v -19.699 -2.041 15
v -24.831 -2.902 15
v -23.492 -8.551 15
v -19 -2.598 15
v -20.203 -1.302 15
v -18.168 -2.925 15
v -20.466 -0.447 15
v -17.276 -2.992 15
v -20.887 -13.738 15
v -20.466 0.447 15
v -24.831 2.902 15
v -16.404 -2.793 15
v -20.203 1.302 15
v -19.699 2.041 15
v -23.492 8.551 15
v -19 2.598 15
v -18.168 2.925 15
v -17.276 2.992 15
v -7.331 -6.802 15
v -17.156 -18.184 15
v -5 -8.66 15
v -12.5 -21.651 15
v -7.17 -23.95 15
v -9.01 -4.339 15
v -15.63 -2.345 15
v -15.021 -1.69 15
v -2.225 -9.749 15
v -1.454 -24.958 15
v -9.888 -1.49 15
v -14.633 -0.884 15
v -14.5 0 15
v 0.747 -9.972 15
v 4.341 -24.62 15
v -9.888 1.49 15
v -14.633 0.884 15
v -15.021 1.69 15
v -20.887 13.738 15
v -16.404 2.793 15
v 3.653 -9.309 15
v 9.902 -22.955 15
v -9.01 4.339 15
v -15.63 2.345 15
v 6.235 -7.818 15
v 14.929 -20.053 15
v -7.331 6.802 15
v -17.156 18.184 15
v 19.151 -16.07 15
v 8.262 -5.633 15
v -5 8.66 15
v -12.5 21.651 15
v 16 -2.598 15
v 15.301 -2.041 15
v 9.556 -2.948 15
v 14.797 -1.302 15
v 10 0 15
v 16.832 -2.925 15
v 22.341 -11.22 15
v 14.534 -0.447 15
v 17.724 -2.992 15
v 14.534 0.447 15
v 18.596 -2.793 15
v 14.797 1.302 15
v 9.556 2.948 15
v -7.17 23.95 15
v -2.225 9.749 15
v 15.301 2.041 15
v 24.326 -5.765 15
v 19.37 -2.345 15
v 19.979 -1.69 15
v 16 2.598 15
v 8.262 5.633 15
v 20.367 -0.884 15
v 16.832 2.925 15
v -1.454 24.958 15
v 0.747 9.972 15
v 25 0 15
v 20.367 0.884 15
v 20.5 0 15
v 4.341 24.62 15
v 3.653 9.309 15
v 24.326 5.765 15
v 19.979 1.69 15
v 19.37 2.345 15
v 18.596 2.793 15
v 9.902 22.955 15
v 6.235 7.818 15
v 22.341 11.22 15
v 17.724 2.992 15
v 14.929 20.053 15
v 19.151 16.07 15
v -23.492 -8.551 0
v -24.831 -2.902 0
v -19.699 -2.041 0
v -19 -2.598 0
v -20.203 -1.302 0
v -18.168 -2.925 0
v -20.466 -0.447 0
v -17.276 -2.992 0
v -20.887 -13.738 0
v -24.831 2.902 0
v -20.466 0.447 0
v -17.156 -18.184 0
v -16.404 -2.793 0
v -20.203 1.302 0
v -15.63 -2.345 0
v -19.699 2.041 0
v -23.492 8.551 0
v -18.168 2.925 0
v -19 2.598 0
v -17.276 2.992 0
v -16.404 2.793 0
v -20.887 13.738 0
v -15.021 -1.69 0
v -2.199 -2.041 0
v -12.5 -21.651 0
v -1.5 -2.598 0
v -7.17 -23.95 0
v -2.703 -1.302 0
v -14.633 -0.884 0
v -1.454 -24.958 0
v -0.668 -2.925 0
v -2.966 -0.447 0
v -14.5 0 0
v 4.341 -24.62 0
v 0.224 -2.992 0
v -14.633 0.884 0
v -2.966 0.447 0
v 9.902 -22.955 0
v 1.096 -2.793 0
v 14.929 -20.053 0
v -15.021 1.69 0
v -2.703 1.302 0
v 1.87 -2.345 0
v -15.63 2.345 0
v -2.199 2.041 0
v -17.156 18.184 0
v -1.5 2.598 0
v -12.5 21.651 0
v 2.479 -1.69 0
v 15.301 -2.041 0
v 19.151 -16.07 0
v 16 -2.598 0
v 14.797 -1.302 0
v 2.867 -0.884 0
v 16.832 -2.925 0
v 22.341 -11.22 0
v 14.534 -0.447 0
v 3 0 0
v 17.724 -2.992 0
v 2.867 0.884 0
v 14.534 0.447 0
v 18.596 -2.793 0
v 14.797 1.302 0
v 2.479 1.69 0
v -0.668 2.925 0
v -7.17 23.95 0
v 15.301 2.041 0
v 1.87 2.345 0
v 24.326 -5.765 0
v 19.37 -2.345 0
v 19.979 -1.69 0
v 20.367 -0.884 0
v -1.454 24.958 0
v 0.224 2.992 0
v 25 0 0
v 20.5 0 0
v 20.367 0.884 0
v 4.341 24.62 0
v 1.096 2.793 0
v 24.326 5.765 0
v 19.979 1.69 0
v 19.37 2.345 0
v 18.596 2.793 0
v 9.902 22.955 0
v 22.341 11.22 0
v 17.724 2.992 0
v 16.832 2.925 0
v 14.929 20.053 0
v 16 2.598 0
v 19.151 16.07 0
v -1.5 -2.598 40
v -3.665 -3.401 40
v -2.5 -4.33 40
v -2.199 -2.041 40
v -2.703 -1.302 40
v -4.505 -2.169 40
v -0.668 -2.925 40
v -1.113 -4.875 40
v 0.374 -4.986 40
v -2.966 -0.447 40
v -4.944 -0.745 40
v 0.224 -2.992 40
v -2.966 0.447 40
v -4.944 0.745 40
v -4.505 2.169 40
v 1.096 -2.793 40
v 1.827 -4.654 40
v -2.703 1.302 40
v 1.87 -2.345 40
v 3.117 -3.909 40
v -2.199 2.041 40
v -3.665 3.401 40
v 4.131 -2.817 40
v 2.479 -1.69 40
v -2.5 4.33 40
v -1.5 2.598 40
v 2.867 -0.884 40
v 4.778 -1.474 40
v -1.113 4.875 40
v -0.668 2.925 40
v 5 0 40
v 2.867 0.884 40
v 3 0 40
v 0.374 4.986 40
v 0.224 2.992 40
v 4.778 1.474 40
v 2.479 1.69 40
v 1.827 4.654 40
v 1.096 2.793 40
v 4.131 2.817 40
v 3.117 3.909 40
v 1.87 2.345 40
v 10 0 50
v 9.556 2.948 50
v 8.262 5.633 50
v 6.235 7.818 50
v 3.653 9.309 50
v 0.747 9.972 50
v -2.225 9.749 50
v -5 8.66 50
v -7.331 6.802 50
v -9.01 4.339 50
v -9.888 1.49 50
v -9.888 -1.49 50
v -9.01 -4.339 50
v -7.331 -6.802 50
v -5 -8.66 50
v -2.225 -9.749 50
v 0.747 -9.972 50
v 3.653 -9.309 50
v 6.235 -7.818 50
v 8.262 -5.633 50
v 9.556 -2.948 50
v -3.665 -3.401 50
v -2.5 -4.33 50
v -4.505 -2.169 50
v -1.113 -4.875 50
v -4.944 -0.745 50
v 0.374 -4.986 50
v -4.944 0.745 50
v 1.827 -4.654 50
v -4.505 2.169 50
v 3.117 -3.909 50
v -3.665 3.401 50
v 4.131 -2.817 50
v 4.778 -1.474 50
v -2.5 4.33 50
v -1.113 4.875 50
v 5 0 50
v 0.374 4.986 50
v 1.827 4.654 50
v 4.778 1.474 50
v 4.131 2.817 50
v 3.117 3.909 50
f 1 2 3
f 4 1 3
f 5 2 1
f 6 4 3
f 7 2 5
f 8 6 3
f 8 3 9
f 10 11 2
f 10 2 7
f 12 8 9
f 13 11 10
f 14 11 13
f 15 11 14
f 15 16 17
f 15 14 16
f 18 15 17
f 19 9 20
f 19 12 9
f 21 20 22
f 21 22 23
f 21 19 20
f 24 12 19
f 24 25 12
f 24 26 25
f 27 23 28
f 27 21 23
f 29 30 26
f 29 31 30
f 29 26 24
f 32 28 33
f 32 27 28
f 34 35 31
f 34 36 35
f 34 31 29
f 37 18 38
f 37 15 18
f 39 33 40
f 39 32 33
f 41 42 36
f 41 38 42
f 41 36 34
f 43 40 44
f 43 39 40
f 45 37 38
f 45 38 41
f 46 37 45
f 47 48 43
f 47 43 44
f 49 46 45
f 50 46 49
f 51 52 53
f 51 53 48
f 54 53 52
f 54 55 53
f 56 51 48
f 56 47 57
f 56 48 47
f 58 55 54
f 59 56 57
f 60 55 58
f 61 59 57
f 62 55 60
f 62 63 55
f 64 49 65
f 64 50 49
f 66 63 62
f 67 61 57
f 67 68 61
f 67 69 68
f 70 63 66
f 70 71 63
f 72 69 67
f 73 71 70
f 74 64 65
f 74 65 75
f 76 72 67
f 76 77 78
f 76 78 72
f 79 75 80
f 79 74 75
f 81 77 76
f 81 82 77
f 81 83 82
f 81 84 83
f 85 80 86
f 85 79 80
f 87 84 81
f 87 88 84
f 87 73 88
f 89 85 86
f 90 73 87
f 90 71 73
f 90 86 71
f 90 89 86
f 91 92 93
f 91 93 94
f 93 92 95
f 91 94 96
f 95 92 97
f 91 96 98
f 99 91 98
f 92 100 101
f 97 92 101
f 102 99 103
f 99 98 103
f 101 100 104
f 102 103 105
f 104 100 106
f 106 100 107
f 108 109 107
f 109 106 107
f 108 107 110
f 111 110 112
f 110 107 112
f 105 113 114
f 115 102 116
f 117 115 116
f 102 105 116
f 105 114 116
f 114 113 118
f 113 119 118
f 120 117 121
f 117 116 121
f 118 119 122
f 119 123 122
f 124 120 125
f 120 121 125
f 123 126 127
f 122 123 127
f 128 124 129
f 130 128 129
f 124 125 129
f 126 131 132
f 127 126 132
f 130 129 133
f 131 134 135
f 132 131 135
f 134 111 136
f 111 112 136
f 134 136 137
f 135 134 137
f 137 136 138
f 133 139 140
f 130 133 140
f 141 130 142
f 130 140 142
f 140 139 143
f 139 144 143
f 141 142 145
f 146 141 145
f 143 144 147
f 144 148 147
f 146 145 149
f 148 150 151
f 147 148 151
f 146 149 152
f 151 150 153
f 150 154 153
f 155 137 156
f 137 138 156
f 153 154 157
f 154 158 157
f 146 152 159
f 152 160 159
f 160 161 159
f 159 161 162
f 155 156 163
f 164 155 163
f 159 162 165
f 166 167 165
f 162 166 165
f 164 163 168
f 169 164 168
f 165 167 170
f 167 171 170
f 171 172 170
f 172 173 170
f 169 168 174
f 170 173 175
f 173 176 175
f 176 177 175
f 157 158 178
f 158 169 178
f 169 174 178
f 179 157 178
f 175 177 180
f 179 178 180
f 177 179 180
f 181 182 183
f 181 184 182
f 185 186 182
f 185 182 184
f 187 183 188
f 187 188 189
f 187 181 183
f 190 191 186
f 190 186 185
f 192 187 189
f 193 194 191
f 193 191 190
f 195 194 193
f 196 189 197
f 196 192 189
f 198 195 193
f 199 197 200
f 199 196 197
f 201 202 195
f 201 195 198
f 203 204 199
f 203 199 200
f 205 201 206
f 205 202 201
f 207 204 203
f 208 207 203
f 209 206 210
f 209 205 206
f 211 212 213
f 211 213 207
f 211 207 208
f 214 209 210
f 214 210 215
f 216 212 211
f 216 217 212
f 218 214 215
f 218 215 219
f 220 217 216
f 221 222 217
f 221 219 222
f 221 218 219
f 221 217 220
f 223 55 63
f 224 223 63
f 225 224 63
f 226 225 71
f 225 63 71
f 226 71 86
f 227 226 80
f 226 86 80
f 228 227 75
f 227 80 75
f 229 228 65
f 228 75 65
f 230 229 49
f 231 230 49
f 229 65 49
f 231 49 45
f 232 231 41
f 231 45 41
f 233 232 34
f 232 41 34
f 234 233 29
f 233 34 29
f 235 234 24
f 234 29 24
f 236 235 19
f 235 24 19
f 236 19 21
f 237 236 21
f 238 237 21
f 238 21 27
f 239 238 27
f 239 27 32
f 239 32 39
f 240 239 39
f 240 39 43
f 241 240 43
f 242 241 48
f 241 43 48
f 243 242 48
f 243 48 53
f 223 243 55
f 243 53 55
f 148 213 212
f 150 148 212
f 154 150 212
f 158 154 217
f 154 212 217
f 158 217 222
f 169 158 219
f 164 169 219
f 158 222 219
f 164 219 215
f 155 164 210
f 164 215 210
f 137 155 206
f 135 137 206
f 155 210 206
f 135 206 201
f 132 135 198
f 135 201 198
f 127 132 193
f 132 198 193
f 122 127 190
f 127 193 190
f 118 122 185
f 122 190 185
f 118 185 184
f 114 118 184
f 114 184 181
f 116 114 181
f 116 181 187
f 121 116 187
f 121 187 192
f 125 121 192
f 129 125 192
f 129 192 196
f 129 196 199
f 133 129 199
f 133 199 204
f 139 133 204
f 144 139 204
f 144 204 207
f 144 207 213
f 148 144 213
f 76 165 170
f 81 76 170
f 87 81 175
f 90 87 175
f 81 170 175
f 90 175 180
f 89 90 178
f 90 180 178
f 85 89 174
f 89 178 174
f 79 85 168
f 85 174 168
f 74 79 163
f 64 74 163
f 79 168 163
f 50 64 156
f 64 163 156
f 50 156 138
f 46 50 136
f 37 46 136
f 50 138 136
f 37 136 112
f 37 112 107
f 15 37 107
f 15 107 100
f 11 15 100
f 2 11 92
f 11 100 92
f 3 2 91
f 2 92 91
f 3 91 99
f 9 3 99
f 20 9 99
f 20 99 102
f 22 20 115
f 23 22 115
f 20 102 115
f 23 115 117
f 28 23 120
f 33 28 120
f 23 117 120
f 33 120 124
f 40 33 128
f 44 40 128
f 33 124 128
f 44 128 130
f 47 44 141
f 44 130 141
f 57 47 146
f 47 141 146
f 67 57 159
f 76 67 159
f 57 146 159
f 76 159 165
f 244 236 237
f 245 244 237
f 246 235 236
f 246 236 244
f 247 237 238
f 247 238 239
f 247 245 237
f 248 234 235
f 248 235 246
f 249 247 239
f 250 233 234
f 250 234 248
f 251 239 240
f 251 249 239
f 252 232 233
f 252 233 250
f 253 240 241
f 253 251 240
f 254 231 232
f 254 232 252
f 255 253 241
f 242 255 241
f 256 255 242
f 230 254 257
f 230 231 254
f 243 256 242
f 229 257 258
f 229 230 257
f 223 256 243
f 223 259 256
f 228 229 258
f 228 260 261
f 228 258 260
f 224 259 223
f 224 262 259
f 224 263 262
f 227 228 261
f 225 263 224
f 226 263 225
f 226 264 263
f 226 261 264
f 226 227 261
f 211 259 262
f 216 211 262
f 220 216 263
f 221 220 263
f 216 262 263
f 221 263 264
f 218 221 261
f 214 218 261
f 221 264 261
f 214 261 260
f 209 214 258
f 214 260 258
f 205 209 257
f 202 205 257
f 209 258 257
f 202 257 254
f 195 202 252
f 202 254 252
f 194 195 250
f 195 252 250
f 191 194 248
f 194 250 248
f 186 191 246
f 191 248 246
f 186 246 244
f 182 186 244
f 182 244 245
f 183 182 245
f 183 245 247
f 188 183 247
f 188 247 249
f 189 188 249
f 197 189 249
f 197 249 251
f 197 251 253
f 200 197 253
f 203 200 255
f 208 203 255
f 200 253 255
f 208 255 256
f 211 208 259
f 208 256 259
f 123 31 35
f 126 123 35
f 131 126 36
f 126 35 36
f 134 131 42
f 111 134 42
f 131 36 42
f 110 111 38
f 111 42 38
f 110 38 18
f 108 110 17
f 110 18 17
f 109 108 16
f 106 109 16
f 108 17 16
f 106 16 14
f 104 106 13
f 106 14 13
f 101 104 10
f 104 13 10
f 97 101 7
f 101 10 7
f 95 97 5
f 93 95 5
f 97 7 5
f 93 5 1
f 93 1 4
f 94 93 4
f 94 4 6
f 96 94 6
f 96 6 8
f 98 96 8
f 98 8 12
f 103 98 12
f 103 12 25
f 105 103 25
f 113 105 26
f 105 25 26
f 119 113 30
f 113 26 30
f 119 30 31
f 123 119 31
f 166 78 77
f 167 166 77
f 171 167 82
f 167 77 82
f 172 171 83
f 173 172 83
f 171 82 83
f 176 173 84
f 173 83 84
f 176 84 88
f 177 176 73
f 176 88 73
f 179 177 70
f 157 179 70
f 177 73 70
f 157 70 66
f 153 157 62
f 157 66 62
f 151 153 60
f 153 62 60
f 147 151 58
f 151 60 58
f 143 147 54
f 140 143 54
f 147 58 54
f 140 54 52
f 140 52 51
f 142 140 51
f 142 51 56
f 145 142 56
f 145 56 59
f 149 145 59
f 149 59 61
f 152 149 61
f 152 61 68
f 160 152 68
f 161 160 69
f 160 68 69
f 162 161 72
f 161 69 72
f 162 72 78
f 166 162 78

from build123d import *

# Parameters (mm, degrees)
F0_R     = 25
F1_DEPTH = 15
F2_R     = 10
F3_DEPTH = 35
F4_R     = 3
F5_DEPTH = 15
F6_R     = 3
F7_DEPTH = 50
F8_R     = 5
F9_DEPTH = 10


with BuildPart() as f1:
    # F0 (on Top) → F1 (new body)
    with BuildSketch(Plane.XY):
        Circle(F0_R)
    extrude(amount=F1_DEPTH)

    # F2 (on face) → F3 (join)
    with BuildSketch(Plane.XY.offset(15)):
        Circle(F2_R)
    extrude(amount=F3_DEPTH)

    # F4 (on face) → F5 (cut)
    with BuildSketch(Plane.XY.offset(15)):
        with Locations((-17.5, 0)):
            Circle(F4_R)
        with Locations((17.5, 0)):
            Circle(F4_R)
    extrude(amount=-F5_DEPTH, mode=Mode.SUBTRACT)

    # F6 (on face) → F7 (cut)
    with BuildSketch(Plane.XY.offset(50)):
        Circle(F6_R)
    extrude(amount=-F7_DEPTH, mode=Mode.SUBTRACT)

    # F8 (on face) → F9 (cut)
    with BuildSketch(Plane.XY.offset(50)):
        Circle(F8_R)
    extrude(amount=-F9_DEPTH, mode=Mode.SUBTRACT)


solid = f1.part
